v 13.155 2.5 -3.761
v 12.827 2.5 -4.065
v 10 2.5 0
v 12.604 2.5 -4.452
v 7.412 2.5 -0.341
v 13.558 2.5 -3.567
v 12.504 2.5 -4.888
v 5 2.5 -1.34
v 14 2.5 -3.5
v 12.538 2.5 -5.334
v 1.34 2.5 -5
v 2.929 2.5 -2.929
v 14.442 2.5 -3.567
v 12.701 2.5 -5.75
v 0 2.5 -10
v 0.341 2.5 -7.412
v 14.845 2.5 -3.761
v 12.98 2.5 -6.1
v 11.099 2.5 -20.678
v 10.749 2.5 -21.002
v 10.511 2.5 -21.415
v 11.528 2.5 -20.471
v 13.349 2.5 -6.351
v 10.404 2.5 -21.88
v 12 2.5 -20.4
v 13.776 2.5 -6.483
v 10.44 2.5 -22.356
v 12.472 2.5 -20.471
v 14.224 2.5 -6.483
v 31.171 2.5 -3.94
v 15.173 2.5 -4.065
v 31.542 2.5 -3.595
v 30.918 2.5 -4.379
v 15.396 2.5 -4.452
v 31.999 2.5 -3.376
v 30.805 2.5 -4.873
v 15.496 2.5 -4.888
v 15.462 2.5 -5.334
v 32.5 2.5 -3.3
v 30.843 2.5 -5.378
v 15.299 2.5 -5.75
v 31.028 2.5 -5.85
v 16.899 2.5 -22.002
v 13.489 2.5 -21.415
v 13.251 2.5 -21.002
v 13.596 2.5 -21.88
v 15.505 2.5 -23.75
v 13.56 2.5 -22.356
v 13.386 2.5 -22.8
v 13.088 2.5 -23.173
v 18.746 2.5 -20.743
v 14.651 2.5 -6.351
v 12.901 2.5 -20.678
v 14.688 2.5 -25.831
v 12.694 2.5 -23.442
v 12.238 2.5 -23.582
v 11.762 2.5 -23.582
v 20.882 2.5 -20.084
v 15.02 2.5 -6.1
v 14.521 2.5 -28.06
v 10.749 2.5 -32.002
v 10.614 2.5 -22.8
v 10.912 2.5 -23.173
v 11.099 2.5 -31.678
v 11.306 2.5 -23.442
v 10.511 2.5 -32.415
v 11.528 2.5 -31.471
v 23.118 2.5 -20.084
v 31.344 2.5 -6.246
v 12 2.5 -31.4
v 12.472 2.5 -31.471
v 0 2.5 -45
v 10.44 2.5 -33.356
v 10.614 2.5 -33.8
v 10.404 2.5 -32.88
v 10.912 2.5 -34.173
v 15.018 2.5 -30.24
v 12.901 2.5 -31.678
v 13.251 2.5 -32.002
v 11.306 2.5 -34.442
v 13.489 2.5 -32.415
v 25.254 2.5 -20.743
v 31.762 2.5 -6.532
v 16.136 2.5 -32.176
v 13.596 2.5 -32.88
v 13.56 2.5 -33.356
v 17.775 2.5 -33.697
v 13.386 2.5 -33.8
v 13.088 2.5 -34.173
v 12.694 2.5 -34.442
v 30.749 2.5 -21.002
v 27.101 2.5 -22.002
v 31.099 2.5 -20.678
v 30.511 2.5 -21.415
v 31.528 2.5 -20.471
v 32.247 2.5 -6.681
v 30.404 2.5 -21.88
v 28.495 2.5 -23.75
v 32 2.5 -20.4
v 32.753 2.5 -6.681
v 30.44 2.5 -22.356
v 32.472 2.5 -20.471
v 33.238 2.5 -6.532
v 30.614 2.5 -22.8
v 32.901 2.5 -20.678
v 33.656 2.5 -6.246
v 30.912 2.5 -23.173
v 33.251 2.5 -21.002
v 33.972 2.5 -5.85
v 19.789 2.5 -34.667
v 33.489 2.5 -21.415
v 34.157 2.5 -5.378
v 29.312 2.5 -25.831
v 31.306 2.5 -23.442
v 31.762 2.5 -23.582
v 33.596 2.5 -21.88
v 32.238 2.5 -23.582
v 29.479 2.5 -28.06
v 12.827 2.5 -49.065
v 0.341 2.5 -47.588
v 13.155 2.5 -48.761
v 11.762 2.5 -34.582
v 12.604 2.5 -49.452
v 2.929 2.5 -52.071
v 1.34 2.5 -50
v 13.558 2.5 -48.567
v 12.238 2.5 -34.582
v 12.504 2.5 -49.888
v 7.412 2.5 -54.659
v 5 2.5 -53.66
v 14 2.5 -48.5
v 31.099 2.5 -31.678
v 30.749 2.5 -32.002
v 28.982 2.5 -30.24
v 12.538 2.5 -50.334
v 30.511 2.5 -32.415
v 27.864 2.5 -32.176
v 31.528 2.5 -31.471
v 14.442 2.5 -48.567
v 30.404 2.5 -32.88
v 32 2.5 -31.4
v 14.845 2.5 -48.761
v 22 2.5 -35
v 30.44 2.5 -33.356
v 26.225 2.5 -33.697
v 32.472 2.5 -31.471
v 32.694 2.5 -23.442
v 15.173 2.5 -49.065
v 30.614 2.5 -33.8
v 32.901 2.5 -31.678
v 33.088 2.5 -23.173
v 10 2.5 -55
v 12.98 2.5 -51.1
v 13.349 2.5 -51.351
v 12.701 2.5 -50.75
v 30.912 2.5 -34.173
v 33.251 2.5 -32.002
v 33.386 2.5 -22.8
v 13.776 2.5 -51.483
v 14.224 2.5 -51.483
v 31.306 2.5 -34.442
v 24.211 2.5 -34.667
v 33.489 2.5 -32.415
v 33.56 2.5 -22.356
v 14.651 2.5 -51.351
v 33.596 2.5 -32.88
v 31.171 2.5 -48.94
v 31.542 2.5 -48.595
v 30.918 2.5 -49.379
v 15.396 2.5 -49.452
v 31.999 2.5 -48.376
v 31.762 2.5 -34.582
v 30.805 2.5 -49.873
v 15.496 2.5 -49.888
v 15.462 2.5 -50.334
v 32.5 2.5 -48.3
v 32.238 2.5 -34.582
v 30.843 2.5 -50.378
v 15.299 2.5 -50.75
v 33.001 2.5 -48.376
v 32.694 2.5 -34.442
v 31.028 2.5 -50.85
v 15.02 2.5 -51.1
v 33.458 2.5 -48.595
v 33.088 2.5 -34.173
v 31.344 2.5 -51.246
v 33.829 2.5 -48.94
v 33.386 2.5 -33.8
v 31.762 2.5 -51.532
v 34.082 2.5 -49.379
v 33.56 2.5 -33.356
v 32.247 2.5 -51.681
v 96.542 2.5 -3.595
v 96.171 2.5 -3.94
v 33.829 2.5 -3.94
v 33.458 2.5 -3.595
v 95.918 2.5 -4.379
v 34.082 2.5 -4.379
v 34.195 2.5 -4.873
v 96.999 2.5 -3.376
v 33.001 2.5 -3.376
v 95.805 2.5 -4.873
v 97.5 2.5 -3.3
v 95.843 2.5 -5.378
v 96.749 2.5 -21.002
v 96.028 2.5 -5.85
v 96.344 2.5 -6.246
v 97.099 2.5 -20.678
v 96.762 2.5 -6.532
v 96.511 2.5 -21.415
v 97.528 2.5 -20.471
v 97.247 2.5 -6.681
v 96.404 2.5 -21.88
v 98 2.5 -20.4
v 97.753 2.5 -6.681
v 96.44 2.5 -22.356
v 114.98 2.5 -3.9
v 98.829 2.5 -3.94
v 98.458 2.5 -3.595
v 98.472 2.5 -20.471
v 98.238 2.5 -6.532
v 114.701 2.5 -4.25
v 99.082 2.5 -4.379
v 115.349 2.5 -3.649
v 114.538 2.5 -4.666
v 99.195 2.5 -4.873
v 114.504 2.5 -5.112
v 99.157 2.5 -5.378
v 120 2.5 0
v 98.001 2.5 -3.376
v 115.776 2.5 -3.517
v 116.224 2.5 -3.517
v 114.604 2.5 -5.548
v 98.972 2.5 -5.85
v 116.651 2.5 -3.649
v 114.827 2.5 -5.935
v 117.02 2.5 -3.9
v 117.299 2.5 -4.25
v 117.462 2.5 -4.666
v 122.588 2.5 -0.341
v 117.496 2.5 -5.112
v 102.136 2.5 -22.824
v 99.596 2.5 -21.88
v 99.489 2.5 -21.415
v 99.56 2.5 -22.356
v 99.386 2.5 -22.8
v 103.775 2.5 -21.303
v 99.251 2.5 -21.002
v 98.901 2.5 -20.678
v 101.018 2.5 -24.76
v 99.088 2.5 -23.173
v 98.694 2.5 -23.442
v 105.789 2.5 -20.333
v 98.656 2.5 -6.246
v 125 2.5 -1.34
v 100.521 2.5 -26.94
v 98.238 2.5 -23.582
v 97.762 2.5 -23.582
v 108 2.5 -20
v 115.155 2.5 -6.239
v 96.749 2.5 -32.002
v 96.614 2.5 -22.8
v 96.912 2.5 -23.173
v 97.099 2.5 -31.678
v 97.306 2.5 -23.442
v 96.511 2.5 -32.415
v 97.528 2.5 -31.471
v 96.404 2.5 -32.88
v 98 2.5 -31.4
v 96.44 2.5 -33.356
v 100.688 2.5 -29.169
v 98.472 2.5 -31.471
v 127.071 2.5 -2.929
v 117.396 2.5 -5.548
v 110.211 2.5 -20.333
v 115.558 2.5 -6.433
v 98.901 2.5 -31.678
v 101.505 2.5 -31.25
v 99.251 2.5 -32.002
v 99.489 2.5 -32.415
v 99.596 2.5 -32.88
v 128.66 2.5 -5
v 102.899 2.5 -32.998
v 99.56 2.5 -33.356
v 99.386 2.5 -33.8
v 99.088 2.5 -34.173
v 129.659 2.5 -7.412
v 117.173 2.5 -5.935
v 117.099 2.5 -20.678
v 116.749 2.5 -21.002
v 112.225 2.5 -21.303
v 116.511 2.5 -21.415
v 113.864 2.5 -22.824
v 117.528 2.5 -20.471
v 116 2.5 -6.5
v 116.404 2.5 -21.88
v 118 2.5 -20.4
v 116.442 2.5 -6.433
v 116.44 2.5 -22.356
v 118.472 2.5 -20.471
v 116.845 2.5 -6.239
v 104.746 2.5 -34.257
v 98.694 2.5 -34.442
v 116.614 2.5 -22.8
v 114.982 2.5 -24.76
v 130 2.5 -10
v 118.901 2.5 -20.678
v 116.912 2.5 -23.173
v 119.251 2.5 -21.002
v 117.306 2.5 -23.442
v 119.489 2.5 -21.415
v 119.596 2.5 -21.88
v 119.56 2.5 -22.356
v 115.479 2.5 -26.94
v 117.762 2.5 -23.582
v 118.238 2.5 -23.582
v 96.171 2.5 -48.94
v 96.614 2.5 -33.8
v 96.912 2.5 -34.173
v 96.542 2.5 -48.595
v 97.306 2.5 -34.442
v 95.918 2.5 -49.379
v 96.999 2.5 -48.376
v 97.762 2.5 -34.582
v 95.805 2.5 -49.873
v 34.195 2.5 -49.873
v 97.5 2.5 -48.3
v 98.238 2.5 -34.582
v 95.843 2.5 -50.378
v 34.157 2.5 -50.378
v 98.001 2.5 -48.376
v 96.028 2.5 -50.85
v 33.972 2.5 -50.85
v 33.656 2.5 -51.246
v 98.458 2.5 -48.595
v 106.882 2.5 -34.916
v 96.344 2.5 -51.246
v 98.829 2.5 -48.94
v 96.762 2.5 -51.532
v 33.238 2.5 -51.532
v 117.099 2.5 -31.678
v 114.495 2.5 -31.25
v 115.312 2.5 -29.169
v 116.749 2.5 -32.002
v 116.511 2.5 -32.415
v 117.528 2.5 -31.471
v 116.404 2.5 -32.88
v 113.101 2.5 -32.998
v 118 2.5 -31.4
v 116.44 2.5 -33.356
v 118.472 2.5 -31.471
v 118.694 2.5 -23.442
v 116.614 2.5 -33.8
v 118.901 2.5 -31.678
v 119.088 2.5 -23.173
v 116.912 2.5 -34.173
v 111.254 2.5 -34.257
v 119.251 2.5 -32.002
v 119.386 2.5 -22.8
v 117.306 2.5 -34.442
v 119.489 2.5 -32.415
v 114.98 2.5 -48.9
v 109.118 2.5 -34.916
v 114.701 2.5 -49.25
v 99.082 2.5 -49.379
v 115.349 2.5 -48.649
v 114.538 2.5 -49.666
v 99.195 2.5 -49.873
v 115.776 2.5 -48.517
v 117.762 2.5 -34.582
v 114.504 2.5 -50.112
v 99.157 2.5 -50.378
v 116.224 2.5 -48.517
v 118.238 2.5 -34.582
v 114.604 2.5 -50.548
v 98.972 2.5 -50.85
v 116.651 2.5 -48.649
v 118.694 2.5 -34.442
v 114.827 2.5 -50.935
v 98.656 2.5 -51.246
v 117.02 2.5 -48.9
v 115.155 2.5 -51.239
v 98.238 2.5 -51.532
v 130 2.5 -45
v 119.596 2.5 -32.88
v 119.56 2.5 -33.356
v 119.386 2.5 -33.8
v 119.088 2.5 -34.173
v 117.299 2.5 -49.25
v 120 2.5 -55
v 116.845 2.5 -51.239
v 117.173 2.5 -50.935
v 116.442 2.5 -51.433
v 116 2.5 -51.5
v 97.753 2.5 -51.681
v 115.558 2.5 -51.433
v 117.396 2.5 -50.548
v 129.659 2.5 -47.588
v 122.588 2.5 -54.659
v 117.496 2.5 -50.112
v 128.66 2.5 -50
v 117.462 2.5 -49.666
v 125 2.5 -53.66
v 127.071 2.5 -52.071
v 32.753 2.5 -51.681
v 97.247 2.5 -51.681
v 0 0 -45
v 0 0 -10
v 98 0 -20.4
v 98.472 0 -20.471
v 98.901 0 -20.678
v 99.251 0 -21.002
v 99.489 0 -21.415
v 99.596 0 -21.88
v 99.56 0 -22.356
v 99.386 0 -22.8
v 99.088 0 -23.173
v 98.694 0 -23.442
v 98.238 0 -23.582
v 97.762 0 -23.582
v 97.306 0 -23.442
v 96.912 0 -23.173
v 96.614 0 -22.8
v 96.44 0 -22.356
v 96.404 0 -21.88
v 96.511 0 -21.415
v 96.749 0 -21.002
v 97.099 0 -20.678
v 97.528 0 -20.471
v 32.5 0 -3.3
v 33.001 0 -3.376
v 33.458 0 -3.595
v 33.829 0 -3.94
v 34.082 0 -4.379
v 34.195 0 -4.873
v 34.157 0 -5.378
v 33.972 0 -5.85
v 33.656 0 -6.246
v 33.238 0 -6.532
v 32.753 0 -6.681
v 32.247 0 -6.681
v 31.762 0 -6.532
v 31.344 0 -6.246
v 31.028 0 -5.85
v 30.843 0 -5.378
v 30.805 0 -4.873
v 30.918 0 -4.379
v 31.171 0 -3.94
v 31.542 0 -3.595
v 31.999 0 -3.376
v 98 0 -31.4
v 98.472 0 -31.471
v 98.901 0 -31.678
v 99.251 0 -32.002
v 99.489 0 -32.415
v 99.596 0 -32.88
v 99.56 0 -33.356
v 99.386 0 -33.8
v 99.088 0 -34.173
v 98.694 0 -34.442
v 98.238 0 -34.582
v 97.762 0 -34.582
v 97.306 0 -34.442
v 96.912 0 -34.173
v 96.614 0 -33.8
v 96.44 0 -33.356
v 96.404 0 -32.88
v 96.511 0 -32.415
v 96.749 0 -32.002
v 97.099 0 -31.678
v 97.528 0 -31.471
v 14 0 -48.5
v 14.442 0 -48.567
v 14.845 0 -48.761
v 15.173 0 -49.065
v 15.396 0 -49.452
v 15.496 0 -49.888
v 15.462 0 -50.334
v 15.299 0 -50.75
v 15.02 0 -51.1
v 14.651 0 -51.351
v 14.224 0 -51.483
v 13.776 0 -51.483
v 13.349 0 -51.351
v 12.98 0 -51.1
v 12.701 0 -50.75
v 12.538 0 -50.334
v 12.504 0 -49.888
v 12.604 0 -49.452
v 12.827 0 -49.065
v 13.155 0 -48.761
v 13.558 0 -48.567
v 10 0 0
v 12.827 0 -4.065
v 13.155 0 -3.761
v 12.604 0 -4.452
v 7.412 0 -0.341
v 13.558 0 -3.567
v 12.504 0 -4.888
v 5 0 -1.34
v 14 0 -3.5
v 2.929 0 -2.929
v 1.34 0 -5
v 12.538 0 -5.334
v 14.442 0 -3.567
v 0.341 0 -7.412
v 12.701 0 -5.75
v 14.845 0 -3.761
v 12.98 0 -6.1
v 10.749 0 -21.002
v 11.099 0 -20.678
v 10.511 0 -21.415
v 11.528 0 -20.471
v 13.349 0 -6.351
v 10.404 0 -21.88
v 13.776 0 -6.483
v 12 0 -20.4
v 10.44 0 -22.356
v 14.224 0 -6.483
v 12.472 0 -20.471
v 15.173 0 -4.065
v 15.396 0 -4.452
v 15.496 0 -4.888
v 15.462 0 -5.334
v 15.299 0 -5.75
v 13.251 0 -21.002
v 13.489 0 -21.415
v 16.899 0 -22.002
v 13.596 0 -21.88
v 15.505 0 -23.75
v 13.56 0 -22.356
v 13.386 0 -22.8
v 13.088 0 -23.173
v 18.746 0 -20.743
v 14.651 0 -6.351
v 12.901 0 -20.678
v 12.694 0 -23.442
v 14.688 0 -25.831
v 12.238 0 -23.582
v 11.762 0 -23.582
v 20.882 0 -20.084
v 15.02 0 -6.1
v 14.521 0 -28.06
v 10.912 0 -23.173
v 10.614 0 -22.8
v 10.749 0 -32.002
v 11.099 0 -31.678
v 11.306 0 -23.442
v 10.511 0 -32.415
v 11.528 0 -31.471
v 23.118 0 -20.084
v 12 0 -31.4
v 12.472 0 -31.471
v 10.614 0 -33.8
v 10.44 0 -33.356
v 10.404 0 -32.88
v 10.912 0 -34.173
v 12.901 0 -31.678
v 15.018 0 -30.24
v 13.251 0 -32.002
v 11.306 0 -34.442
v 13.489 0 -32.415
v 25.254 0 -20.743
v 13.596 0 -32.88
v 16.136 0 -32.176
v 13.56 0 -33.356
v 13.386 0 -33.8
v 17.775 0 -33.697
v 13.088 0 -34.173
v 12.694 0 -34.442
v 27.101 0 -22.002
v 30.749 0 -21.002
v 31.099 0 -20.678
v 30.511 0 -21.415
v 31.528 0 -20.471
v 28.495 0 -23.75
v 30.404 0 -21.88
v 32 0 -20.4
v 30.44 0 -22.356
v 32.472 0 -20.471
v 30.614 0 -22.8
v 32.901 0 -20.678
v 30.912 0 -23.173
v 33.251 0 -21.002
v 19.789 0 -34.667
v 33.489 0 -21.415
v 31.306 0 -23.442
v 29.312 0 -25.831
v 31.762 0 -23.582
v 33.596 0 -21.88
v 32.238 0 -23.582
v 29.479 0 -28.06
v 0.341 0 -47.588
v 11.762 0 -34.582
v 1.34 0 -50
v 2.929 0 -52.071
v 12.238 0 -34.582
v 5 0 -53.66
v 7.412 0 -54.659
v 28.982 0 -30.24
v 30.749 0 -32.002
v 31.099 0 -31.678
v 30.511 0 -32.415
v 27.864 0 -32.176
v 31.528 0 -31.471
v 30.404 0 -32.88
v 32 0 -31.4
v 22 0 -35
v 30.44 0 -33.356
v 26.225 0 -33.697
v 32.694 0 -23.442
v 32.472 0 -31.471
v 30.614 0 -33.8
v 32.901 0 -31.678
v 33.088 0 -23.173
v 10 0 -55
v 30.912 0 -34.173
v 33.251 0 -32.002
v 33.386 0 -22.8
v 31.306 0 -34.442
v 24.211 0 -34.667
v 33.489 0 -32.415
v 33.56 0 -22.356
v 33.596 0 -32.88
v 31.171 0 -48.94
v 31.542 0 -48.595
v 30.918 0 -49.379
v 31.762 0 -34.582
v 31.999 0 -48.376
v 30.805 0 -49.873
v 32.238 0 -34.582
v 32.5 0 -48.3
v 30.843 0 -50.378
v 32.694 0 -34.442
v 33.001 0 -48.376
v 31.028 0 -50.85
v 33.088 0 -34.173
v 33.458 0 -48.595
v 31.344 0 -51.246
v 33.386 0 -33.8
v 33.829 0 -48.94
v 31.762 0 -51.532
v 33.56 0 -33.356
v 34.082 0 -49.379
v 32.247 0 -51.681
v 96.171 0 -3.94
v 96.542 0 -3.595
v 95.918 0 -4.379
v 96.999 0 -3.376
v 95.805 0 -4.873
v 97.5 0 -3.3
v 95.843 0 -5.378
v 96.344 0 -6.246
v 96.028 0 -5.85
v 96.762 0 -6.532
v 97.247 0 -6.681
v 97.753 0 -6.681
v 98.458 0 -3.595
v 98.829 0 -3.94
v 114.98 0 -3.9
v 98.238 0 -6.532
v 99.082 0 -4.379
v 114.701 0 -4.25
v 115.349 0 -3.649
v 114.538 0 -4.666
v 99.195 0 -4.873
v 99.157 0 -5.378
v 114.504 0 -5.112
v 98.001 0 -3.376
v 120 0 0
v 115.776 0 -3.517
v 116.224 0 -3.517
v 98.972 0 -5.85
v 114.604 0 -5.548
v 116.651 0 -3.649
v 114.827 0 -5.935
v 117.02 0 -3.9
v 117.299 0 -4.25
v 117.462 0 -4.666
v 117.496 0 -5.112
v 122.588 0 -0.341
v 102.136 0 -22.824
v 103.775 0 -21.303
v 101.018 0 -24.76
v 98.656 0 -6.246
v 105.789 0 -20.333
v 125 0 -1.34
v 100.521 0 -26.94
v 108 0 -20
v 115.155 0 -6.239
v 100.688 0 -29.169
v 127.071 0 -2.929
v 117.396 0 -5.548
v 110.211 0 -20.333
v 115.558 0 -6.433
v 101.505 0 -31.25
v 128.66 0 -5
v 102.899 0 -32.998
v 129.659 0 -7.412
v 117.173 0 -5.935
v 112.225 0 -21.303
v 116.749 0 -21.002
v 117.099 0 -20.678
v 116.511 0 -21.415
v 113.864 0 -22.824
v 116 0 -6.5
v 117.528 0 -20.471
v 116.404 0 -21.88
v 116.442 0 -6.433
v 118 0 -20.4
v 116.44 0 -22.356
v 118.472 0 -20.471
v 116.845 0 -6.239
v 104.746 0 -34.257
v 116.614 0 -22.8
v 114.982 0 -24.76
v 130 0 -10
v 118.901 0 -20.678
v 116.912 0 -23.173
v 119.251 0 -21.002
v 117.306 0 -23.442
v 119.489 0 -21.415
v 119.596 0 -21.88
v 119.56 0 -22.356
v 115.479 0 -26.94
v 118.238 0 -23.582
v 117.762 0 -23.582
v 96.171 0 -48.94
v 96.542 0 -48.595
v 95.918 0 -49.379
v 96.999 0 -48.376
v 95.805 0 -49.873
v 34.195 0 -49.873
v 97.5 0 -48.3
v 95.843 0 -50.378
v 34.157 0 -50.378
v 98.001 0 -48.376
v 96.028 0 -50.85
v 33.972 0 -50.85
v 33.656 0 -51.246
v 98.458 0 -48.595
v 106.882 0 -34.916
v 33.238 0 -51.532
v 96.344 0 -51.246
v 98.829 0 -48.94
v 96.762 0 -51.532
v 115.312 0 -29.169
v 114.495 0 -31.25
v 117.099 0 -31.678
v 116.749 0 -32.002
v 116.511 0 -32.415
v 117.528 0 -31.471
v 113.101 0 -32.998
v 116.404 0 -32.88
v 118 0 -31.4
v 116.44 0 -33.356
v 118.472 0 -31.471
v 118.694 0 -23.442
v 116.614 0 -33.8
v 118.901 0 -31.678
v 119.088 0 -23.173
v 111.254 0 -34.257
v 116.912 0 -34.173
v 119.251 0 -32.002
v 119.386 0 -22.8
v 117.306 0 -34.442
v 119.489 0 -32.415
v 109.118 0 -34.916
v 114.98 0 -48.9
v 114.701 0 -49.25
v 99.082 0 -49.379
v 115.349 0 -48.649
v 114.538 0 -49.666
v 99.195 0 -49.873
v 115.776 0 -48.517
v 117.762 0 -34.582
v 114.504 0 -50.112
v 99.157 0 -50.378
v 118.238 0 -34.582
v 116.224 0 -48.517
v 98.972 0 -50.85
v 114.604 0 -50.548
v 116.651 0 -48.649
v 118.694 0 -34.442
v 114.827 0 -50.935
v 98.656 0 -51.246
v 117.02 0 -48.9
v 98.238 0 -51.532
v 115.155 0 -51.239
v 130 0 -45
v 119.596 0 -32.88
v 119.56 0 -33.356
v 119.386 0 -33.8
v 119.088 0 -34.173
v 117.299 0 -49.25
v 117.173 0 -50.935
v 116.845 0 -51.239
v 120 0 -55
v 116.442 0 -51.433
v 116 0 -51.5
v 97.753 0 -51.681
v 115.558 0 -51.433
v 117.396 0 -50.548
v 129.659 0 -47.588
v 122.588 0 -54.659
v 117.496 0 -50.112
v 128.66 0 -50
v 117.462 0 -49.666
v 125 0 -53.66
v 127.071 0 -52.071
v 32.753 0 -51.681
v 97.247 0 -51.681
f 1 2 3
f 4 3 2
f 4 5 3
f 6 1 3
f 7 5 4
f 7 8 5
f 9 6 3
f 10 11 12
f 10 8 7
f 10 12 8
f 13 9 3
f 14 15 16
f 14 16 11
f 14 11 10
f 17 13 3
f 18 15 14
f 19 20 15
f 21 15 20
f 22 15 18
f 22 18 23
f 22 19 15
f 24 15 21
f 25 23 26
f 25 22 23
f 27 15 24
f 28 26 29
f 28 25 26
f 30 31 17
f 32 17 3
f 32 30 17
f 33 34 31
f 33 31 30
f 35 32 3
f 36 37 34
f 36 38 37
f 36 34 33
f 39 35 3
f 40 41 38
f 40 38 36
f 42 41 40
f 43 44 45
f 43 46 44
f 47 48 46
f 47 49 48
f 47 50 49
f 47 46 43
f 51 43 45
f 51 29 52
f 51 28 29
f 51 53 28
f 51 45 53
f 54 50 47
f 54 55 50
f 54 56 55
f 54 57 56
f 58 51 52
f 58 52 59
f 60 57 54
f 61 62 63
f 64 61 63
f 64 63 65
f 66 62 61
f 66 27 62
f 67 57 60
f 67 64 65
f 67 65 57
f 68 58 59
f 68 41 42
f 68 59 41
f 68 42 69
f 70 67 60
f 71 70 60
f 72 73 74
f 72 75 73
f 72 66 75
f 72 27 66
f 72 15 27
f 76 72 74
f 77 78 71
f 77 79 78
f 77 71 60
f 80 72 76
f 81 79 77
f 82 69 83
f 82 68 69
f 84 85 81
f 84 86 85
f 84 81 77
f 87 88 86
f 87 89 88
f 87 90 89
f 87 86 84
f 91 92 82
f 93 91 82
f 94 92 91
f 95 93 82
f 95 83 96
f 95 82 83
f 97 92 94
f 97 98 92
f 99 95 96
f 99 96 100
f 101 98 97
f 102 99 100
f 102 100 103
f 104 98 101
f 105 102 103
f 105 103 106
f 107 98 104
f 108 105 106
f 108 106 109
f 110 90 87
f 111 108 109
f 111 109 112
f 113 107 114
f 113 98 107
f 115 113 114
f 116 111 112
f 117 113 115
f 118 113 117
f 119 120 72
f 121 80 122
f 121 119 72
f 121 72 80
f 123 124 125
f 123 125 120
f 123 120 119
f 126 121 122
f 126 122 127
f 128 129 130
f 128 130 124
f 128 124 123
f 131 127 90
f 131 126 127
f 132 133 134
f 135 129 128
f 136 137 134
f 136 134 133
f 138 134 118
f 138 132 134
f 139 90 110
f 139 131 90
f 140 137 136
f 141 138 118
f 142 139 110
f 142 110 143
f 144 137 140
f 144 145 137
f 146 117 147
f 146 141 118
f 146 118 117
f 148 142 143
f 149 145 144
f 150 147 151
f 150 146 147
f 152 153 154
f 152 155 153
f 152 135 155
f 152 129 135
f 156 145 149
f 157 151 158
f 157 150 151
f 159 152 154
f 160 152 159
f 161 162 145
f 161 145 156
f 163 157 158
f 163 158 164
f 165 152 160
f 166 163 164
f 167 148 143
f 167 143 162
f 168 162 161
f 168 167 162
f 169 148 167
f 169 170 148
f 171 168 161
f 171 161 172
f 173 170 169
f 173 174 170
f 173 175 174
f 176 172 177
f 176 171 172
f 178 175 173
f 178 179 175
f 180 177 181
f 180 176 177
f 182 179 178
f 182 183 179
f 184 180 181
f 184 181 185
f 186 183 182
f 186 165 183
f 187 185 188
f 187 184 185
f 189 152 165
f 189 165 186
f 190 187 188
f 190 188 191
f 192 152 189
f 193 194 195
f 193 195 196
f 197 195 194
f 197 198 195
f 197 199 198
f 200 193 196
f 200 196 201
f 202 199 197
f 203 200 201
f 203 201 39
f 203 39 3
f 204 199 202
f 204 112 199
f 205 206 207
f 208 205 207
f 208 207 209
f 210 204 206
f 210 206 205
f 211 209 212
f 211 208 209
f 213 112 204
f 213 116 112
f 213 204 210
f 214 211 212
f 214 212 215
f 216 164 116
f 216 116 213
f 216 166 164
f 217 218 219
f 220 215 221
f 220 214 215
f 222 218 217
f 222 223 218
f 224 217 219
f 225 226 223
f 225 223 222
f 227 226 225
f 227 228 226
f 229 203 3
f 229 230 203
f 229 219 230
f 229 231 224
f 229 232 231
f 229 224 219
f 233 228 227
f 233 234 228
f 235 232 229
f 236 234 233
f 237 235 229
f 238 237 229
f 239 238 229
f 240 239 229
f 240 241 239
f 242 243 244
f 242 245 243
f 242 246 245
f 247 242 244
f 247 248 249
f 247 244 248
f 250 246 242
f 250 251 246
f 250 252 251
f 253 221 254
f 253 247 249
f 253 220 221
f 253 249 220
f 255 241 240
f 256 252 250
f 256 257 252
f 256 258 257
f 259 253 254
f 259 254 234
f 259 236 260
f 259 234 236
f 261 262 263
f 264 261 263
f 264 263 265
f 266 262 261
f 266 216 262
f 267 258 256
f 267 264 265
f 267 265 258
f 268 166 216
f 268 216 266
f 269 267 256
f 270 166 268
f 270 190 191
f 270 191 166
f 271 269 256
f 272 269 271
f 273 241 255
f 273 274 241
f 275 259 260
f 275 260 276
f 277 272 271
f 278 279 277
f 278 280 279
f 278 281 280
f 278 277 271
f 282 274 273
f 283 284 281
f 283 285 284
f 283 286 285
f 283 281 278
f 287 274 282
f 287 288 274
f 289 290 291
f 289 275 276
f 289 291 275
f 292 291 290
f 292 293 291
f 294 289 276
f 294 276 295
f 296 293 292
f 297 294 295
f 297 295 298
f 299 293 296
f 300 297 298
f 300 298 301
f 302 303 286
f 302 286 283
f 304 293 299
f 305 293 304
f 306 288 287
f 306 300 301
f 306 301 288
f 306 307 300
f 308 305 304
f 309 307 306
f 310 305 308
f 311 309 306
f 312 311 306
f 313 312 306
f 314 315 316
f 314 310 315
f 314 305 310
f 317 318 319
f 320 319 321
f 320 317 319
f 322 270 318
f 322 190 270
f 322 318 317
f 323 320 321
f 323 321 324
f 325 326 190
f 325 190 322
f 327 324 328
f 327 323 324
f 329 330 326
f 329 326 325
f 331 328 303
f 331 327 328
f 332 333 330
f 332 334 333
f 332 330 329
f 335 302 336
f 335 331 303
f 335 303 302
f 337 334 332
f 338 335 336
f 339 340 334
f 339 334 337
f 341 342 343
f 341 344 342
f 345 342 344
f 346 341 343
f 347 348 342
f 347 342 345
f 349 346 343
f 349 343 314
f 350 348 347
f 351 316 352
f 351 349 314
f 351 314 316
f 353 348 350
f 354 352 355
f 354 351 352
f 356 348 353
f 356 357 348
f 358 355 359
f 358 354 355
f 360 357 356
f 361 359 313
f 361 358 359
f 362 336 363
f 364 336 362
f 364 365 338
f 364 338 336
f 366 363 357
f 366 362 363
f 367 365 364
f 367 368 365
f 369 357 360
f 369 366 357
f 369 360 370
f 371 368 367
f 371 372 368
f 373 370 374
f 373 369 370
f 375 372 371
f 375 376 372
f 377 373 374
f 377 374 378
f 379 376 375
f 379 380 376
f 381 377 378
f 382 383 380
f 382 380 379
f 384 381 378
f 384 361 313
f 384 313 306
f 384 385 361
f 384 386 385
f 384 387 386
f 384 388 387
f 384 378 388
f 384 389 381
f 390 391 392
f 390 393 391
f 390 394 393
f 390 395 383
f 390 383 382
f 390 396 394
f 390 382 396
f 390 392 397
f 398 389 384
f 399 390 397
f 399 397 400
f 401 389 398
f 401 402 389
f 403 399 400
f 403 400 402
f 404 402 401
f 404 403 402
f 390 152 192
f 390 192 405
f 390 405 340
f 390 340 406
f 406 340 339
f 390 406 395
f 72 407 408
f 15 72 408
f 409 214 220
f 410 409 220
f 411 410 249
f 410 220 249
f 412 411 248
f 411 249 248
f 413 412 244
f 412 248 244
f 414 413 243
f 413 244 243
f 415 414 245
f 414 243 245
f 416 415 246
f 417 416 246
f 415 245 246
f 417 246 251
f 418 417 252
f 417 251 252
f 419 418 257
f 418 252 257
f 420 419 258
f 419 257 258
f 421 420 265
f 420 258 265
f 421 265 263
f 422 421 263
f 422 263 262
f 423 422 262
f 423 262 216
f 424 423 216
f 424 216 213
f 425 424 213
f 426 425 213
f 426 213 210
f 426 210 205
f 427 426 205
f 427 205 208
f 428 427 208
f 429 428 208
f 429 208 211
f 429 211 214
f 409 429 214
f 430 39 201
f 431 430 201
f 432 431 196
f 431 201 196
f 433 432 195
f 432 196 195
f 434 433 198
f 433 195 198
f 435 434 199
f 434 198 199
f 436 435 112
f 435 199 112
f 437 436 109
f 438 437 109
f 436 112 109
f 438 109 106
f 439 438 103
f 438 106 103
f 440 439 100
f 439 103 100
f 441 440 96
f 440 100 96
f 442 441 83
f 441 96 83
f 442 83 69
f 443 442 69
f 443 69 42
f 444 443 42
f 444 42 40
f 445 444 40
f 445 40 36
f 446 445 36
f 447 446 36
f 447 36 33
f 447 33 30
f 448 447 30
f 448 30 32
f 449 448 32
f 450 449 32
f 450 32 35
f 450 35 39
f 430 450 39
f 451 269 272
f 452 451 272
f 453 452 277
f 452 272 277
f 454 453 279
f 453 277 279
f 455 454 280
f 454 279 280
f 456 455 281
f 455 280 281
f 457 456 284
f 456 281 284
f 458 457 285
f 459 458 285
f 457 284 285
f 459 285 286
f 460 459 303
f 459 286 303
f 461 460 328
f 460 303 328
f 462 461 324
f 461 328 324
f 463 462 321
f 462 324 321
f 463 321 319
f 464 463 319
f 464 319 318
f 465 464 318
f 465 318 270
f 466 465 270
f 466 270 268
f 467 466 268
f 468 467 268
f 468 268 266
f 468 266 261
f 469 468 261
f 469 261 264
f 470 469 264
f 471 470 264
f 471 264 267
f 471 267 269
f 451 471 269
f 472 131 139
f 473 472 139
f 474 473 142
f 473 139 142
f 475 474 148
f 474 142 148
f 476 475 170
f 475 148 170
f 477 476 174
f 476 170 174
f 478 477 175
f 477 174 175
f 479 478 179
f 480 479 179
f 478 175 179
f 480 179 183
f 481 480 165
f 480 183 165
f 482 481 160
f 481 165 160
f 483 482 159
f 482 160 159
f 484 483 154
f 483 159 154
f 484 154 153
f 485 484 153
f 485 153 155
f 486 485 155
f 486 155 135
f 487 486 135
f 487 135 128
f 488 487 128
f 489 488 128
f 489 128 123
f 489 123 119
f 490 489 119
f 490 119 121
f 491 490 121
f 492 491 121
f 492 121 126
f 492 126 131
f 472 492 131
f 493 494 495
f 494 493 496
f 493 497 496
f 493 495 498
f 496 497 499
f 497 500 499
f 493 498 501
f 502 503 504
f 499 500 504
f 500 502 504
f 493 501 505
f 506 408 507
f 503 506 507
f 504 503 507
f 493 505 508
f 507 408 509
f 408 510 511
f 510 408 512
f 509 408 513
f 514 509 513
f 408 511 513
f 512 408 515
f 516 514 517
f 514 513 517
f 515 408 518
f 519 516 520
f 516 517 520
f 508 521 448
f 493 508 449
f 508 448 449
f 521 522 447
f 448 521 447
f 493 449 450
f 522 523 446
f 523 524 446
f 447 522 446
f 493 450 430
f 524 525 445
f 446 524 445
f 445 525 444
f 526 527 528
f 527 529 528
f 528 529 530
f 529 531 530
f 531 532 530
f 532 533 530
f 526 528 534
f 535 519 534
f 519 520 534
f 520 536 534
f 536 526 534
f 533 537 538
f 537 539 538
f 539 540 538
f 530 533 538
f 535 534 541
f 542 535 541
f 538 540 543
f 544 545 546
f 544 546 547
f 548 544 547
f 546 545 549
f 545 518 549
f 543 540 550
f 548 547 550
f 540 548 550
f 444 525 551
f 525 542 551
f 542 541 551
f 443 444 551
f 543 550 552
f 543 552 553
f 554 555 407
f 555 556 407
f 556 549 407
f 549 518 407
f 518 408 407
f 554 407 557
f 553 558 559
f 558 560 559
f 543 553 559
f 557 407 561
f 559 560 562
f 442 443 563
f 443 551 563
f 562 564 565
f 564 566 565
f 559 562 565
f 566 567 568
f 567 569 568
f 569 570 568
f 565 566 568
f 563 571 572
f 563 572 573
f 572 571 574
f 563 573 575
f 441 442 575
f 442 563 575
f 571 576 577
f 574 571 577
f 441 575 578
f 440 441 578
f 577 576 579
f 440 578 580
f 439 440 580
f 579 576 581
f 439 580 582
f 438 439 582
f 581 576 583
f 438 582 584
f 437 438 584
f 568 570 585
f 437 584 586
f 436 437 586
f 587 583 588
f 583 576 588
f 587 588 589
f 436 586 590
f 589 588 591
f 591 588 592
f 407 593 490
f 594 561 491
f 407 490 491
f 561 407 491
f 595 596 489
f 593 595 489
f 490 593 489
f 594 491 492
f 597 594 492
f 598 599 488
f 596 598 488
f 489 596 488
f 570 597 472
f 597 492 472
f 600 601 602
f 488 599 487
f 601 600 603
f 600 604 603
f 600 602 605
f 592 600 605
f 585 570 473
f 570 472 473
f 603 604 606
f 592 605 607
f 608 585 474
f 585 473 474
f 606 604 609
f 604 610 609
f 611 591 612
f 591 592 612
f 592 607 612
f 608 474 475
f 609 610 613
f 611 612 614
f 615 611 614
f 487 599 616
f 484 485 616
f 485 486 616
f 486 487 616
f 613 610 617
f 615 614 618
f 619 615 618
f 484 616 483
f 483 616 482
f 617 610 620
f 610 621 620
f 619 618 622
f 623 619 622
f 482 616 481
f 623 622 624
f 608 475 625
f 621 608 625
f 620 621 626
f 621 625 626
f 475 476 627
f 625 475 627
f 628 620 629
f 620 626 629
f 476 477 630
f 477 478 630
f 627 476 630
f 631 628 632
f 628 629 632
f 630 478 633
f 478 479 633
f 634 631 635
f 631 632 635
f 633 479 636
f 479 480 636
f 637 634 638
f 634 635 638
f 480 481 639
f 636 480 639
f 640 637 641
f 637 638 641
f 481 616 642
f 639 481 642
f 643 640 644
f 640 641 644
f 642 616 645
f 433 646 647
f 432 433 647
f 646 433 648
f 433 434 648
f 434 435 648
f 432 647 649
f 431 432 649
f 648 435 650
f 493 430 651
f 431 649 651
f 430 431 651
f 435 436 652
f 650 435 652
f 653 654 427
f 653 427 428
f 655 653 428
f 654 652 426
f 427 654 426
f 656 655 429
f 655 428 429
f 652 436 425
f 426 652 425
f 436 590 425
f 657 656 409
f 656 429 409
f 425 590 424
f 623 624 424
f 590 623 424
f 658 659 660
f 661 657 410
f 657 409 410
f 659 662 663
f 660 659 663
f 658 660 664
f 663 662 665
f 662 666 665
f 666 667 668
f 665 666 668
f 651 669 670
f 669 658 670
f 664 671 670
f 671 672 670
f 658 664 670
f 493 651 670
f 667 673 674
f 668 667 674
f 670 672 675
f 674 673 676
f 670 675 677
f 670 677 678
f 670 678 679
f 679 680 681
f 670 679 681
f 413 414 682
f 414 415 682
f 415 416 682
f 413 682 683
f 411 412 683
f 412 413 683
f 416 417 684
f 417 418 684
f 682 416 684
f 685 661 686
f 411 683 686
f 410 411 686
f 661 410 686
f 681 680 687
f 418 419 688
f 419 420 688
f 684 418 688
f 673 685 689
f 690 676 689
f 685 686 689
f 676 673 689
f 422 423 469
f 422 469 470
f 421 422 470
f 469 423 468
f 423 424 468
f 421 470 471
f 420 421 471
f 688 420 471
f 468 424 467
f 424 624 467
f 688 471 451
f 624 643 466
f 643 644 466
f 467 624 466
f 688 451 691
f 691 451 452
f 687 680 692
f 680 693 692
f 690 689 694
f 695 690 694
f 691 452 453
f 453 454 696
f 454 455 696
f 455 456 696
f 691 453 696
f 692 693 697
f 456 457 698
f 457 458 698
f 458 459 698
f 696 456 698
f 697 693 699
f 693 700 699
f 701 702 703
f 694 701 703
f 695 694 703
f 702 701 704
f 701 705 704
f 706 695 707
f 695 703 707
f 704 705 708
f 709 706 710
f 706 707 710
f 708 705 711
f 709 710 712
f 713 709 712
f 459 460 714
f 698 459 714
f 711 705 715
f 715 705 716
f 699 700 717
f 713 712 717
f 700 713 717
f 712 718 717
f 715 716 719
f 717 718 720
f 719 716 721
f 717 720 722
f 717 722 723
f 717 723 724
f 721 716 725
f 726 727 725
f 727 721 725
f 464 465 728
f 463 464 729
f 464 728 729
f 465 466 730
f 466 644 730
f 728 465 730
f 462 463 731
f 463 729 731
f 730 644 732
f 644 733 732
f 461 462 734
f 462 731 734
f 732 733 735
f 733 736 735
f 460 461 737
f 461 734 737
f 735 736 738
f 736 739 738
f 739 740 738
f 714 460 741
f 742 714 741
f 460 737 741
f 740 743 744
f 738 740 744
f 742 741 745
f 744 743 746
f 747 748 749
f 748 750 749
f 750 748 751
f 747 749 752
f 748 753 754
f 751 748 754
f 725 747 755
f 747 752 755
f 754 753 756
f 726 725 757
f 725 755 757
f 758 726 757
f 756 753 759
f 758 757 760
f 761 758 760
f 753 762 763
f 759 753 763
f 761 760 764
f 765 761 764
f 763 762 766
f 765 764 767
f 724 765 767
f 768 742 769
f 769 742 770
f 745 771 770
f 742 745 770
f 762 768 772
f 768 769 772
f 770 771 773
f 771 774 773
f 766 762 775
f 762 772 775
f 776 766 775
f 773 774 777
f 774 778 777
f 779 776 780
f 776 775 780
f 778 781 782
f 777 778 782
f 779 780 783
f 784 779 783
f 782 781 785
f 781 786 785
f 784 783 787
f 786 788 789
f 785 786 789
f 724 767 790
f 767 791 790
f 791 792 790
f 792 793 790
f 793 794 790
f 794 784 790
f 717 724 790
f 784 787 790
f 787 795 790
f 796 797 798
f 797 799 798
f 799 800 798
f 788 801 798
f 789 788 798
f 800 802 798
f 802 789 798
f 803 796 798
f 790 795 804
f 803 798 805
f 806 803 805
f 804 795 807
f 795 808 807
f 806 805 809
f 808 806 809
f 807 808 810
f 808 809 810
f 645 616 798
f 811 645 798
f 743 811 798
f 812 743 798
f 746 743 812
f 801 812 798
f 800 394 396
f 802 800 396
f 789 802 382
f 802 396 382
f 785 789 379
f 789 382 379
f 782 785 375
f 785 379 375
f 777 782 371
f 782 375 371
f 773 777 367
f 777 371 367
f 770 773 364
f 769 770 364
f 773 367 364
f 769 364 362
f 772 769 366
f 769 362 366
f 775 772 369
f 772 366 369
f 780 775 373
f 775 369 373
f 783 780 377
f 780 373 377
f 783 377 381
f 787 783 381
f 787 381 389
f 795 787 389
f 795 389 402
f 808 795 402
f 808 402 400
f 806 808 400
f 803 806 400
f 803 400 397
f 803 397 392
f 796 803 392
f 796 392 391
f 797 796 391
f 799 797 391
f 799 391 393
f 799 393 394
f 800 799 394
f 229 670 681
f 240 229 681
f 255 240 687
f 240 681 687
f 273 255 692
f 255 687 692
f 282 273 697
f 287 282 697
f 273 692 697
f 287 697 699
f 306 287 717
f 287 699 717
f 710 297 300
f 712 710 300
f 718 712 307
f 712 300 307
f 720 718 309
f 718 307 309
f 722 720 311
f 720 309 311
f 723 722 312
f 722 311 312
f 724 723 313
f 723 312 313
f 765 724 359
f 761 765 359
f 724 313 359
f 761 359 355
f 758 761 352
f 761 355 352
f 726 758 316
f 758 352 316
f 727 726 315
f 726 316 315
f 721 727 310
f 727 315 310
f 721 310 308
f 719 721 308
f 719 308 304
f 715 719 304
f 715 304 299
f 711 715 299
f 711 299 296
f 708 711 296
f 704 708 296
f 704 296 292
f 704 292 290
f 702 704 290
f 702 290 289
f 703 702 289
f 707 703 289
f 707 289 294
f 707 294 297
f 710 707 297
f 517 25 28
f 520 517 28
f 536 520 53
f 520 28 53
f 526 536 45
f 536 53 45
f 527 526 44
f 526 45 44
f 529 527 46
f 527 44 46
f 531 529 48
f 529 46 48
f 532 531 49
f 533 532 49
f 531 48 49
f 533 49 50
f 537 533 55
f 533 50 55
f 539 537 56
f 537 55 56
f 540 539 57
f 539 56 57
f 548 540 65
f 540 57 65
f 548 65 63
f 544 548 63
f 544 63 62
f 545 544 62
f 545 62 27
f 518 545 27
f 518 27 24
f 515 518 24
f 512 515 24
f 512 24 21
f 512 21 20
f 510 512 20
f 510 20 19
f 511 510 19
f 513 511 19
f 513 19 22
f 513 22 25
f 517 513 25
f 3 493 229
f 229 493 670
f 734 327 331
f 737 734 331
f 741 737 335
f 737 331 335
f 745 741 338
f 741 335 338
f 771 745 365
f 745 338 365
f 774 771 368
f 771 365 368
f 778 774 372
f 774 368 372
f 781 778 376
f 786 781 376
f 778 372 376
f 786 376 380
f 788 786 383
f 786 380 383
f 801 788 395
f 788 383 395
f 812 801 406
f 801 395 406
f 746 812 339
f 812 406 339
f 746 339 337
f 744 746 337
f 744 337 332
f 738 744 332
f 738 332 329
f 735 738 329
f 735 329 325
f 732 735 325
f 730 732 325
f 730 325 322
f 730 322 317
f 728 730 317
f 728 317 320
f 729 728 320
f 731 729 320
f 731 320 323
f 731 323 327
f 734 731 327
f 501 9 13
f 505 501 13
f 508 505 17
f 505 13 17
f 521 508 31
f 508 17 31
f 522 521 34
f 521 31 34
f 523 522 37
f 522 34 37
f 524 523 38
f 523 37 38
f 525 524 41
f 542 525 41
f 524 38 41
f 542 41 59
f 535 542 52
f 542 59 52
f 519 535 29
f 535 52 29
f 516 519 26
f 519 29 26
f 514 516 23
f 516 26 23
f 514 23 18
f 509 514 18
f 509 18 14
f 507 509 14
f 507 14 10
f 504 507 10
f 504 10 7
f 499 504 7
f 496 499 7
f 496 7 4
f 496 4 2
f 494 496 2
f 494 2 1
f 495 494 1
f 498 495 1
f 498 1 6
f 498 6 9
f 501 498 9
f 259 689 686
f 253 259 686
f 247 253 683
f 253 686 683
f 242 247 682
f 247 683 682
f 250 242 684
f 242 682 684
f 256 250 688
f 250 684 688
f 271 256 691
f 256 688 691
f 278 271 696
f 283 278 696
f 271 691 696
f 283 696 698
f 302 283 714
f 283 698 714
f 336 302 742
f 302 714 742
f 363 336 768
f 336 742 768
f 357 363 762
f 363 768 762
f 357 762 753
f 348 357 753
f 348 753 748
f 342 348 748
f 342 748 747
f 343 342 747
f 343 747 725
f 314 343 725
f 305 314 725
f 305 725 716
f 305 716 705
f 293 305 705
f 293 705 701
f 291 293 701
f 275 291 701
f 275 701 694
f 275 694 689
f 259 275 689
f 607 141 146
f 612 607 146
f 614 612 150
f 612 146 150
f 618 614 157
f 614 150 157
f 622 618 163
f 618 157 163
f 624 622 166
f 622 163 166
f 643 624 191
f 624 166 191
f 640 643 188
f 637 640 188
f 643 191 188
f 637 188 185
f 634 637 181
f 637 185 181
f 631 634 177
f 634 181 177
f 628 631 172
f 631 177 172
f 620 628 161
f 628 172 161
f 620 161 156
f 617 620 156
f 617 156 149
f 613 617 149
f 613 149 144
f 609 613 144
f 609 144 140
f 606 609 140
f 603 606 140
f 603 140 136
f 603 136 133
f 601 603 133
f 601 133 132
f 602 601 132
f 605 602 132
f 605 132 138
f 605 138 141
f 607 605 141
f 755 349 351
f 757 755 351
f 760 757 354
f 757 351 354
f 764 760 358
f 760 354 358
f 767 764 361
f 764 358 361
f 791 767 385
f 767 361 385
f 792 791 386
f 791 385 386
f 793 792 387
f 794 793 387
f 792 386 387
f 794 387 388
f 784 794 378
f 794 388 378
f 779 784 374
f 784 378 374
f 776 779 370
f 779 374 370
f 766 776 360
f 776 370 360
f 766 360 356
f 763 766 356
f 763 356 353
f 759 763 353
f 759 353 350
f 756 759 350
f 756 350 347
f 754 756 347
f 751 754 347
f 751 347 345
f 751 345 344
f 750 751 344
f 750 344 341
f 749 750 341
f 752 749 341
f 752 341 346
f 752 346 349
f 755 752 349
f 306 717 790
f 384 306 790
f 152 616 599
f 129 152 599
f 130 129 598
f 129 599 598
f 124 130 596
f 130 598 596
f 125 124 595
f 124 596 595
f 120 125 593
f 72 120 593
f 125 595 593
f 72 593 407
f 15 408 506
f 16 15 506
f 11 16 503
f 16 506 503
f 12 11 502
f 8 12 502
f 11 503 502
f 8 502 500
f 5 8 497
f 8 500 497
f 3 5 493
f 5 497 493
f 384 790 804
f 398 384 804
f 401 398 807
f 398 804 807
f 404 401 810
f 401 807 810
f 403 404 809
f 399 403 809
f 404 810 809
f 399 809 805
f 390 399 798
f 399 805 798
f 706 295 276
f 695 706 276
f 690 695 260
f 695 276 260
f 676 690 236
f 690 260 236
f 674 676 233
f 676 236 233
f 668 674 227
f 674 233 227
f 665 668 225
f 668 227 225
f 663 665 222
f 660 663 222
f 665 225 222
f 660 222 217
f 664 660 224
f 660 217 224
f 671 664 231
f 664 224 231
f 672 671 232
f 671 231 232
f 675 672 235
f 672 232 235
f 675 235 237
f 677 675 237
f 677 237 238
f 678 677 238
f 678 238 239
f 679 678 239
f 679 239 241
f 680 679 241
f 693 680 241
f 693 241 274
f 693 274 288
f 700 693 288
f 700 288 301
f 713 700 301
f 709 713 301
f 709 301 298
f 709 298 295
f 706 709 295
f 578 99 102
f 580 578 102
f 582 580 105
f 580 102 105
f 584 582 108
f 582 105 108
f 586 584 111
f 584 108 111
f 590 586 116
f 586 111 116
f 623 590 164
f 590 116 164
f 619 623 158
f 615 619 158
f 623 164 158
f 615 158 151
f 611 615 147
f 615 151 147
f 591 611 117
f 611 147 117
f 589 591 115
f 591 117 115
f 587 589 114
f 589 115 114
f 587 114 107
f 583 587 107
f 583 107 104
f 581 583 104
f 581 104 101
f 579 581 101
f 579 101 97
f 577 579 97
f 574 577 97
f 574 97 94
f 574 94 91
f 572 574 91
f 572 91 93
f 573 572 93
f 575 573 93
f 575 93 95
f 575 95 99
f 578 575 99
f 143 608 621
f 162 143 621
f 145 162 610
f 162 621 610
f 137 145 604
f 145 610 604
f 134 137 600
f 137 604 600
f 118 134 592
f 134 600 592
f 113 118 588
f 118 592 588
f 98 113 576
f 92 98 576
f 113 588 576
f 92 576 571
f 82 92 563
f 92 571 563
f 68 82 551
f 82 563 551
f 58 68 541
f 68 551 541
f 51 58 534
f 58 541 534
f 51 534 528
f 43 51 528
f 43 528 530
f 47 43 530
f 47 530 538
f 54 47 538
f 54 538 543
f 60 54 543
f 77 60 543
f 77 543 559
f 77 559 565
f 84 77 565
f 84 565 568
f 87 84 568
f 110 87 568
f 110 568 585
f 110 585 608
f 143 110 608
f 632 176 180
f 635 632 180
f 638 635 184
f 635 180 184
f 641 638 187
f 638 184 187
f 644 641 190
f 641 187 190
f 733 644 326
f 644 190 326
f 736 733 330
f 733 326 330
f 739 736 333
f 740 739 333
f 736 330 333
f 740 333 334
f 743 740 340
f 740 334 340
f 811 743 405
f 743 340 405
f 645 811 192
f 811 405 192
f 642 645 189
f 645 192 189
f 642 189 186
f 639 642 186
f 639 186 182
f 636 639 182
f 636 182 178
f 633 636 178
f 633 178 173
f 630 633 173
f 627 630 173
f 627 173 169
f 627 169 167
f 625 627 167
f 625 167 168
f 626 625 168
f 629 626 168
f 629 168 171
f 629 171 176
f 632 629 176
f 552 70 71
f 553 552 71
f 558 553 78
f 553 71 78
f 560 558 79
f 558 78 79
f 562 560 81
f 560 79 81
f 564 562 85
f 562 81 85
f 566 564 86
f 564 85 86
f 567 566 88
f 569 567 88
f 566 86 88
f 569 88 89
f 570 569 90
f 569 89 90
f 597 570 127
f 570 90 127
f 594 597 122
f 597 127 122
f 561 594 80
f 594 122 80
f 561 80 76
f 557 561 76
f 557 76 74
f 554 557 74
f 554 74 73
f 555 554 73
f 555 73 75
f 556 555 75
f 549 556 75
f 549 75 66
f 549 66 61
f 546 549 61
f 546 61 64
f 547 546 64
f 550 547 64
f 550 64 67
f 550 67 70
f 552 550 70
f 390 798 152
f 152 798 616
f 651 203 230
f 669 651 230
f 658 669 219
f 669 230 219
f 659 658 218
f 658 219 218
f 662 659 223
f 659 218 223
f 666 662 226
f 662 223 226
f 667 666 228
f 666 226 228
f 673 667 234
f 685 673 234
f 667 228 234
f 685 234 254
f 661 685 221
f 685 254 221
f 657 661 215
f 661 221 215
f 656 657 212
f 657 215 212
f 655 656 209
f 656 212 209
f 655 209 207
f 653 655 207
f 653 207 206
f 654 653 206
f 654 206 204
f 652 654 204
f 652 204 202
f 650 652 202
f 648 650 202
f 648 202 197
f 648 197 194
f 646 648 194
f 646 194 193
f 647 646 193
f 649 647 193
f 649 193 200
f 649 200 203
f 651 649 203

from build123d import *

# Parameters (mm, degrees)
BOSS_EXTRUDE1_DEPTH = 2.5
SKETCH2_R           = 1.5
CUT_EXTRUDE1_DEPTH  = 142.178079035
SKETCH3_R           = 1.6
CUT_EXTRUDE2_DEPTH  = 10
SKETCH4_R           = 1.6
CUT_EXTRUDE3_DEPTH  = 10
SKETCH5_R           = 1.6
CUT_EXTRUDE4_DEPTH  = 10
SKETCH8_R           = 1.6
CUT_EXTRUDE5_DEPTH  = 10
SKETCH9_R           = 1.7
CUT_EXTRUDE6_DEPTH  = 10
SKETCH10_R          = 7.5
CUT_EXTRUDE7_DEPTH  = 10


with BuildPart() as part:
    # Sketch1 → Boss-Extrude1 (new body)
    with BuildSketch(Plane(origin=(0, 0, 0), x_dir=(1, 0, 0), z_dir=(0, 1, 0))):
        with BuildLine():
            Line((10, 0), (120, 0))
            ThreePointArc((120, 0), (127.071067812, 2.928932188), (130, 10))
            Line((130, 10), (130, 45))
            ThreePointArc((130, 45), (127.071067812, 52.071067812), (120, 55))
            Line((120, 55), (10, 55))
            ThreePointArc((10, 55), (2.928932188, 52.071067812), (0, 45))
            Line((0, 45), (0, 10))
            ThreePointArc((0, 10), (2.928932188, 2.928932188), (10, 0))
        make_face()
    extrude(amount=BOSS_EXTRUDE1_DEPTH)

    # Sketch2 → Cut-Extrude1 (cut, through all)
    with BuildSketch(Plane(origin=(0, 2.5, 0), x_dir=(1, 0, 0), z_dir=(0, 1, 0))):
        with Locations((14, 5)):
            Circle(SKETCH2_R)
        with Locations((14, 50)):
            Circle(SKETCH2_R)
        with Locations((116, 5)):
            Circle(SKETCH2_R)
        with Locations((116, 50)):
            Circle(SKETCH2_R)
    extrude(amount=-CUT_EXTRUDE1_DEPTH, mode=Mode.SUBTRACT)

    # Sketch3 → Cut-Extrude2 (cut)
    with BuildSketch(Plane(origin=(0, 2.5, 0), x_dir=(1, 0, 0), z_dir=(0, 1, 0))):
        with Locations((12, 33)):
            Circle(SKETCH3_R)
    extrude(amount=-CUT_EXTRUDE2_DEPTH, mode=Mode.SUBTRACT)

    # Sketch4 → Cut-Extrude3 (cut)
    with BuildSketch(Plane(origin=(0, 2.5, 0), x_dir=(1, 0, 0), z_dir=(0, 1, 0))):
        with Locations((12, 22)):
            Circle(SKETCH4_R)
    extrude(amount=-CUT_EXTRUDE3_DEPTH, mode=Mode.SUBTRACT)

    # Sketch5 → Cut-Extrude4 (cut)
    with BuildSketch(Plane(origin=(0, 2.5, 0), x_dir=(1, 0, 0), z_dir=(0, 1, 0))):
        with Locations((32, 33)):
            Circle(SKETCH5_R)
        with Locations((32, 22)):
            Circle(SKETCH5_R)
    extrude(amount=-CUT_EXTRUDE4_DEPTH, mode=Mode.SUBTRACT)

    # Sketch8 → Cut-Extrude5 (cut)
    with BuildSketch(Plane(origin=(0, 2.5, 0), x_dir=(1, 0, 0), z_dir=(0, 1, 0))):
        with Locations((98, 33)):
            Circle(SKETCH8_R)
        with Locations((98, 22)):
            Circle(SKETCH8_R)
        with Locations((118, 33)):
            Circle(SKETCH8_R)
        with Locations((118, 22)):
            Circle(SKETCH8_R)
    extrude(amount=-CUT_EXTRUDE5_DEPTH, mode=Mode.SUBTRACT)

    # Sketch9 → Cut-Extrude6 (cut)
    with BuildSketch(Plane(origin=(0, 2.5, 0), x_dir=(1, 0, 0), z_dir=(0, 1, 0))):
        with Locations((32.5, 50)):
            Circle(SKETCH9_R)
        with Locations((97.5, 50)):
            Circle(SKETCH9_R)
        with Locations((97.5, 5)):
            Circle(SKETCH9_R)
        with Locations((32.5, 5)):
            Circle(SKETCH9_R)
    extrude(amount=-CUT_EXTRUDE6_DEPTH, mode=Mode.SUBTRACT)

    # Sketch10 → Cut-Extrude7 (cut)
    with BuildSketch(Plane.XZ):
        with Locations((22, -27.5)):
            Circle(SKETCH10_R)
        with Locations((108, -27.5)):
            Circle(SKETCH10_R)
    extrude(amount=-CUT_EXTRUDE7_DEPTH, mode=Mode.SUBTRACT)


solid = part.part
